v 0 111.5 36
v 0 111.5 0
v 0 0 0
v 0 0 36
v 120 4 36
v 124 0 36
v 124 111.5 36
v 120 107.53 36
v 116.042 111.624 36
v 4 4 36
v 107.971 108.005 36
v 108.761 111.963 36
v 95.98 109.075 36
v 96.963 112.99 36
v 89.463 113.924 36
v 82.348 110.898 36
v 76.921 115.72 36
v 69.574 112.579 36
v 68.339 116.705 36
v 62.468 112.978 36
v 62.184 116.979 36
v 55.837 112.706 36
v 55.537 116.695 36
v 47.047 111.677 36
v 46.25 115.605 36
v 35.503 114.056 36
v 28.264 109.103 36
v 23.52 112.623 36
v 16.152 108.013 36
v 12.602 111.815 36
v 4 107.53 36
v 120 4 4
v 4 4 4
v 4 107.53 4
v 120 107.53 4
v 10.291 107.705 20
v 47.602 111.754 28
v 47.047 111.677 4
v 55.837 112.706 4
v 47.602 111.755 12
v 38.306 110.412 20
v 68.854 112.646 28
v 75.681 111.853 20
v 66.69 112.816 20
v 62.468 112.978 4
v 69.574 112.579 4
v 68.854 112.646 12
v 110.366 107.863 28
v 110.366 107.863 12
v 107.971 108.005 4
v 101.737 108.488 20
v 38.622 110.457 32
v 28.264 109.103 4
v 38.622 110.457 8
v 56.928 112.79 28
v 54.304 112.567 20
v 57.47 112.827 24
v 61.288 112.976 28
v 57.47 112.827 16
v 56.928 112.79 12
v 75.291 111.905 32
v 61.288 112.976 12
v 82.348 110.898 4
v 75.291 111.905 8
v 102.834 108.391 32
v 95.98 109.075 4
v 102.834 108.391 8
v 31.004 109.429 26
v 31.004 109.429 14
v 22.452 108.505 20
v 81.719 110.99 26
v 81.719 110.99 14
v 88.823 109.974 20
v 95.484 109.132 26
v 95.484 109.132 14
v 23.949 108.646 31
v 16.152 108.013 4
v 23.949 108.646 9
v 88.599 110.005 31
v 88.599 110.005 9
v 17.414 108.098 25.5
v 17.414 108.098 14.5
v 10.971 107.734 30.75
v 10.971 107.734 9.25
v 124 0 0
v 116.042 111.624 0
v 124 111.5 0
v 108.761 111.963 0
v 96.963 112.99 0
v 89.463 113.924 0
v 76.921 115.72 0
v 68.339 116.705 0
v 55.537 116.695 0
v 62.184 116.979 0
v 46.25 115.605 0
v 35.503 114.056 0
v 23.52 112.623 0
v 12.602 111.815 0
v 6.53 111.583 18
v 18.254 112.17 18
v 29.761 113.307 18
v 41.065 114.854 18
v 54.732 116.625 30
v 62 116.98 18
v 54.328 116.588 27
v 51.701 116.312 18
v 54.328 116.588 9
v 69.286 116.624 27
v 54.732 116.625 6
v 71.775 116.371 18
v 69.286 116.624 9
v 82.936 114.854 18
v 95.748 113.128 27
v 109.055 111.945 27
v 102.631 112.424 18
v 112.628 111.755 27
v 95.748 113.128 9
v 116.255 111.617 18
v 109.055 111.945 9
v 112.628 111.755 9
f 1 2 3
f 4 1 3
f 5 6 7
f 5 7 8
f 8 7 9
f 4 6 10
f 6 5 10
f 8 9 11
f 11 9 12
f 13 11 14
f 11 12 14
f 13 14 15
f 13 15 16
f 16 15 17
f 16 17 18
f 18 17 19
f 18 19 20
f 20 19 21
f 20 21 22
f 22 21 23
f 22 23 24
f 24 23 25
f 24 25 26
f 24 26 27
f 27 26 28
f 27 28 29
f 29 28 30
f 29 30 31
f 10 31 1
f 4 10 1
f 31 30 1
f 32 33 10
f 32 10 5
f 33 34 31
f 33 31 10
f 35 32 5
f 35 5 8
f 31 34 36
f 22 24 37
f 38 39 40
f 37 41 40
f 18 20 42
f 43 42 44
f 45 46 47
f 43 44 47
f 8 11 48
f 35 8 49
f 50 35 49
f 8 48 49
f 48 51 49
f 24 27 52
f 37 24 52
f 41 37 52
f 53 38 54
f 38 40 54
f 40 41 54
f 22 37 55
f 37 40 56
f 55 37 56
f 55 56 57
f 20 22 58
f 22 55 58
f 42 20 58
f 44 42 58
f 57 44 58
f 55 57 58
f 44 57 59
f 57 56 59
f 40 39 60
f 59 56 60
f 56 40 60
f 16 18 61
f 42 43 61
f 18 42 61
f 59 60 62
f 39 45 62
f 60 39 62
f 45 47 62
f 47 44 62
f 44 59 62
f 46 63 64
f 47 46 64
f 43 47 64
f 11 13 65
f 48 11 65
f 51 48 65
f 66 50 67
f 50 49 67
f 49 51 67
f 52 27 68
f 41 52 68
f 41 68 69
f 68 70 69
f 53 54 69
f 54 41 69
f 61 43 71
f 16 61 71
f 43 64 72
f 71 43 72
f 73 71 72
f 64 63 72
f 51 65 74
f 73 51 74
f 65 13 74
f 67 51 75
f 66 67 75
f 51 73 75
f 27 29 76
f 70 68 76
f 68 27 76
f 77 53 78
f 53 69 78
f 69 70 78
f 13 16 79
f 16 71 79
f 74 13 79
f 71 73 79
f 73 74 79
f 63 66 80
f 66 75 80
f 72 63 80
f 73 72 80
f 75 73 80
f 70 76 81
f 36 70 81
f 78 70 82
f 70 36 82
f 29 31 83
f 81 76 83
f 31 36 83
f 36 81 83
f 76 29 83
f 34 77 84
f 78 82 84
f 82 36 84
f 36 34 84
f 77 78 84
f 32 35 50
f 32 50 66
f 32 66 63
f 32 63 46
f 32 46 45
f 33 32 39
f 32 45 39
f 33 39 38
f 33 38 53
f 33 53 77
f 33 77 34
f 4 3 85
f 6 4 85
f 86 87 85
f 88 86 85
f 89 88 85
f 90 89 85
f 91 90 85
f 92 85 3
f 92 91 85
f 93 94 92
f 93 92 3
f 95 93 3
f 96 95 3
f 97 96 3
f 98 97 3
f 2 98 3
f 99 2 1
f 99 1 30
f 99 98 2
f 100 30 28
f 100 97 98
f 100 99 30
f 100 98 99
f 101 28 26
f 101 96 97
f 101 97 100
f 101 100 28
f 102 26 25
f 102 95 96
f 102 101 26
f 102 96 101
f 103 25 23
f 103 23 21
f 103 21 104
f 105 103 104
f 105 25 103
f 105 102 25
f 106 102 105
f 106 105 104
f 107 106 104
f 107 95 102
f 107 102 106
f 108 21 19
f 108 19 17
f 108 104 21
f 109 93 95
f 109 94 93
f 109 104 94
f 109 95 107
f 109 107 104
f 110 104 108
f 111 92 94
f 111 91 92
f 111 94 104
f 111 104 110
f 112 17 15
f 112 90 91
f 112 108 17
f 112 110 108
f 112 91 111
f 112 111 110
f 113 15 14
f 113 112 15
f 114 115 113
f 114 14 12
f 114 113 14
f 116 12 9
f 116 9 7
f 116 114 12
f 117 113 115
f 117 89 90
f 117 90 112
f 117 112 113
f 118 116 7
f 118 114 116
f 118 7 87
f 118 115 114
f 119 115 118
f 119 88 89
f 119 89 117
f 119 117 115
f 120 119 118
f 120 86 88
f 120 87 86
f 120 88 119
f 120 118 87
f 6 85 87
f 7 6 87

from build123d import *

# Parameters (mm, degrees)
F3_DEPTH = 36
F4_T     = -4


with BuildPart() as f3:
    # F2 (on Top) → F3 (new body)
    with BuildSketch(Plane.XY):
        with BuildLine():
            add(Edge.make_bspline(
                [(0, 111.5), (31, 111.5), (62, 122.4592611451), (93, 111.5), (124, 111.5)],
                knots=[0, 0, 0, 0, 0.5, 1, 1, 1, 1], degree=3))
            Line((0, 111.5), (0, 0))
            Line((0, 0), (124, 0))
            Line((124, 0), (124, 111.5))
        make_face()
    extrude(amount=F3_DEPTH)

    # F4
    f4_openings = [f3.faces().sort_by_distance(p)[0] for p in [
        (62, 56.93045, 36),
    ]]
    offset(amount=F4_T, openings=f4_openings, kind=Kind.INTERSECTION)


solid = f3.part
